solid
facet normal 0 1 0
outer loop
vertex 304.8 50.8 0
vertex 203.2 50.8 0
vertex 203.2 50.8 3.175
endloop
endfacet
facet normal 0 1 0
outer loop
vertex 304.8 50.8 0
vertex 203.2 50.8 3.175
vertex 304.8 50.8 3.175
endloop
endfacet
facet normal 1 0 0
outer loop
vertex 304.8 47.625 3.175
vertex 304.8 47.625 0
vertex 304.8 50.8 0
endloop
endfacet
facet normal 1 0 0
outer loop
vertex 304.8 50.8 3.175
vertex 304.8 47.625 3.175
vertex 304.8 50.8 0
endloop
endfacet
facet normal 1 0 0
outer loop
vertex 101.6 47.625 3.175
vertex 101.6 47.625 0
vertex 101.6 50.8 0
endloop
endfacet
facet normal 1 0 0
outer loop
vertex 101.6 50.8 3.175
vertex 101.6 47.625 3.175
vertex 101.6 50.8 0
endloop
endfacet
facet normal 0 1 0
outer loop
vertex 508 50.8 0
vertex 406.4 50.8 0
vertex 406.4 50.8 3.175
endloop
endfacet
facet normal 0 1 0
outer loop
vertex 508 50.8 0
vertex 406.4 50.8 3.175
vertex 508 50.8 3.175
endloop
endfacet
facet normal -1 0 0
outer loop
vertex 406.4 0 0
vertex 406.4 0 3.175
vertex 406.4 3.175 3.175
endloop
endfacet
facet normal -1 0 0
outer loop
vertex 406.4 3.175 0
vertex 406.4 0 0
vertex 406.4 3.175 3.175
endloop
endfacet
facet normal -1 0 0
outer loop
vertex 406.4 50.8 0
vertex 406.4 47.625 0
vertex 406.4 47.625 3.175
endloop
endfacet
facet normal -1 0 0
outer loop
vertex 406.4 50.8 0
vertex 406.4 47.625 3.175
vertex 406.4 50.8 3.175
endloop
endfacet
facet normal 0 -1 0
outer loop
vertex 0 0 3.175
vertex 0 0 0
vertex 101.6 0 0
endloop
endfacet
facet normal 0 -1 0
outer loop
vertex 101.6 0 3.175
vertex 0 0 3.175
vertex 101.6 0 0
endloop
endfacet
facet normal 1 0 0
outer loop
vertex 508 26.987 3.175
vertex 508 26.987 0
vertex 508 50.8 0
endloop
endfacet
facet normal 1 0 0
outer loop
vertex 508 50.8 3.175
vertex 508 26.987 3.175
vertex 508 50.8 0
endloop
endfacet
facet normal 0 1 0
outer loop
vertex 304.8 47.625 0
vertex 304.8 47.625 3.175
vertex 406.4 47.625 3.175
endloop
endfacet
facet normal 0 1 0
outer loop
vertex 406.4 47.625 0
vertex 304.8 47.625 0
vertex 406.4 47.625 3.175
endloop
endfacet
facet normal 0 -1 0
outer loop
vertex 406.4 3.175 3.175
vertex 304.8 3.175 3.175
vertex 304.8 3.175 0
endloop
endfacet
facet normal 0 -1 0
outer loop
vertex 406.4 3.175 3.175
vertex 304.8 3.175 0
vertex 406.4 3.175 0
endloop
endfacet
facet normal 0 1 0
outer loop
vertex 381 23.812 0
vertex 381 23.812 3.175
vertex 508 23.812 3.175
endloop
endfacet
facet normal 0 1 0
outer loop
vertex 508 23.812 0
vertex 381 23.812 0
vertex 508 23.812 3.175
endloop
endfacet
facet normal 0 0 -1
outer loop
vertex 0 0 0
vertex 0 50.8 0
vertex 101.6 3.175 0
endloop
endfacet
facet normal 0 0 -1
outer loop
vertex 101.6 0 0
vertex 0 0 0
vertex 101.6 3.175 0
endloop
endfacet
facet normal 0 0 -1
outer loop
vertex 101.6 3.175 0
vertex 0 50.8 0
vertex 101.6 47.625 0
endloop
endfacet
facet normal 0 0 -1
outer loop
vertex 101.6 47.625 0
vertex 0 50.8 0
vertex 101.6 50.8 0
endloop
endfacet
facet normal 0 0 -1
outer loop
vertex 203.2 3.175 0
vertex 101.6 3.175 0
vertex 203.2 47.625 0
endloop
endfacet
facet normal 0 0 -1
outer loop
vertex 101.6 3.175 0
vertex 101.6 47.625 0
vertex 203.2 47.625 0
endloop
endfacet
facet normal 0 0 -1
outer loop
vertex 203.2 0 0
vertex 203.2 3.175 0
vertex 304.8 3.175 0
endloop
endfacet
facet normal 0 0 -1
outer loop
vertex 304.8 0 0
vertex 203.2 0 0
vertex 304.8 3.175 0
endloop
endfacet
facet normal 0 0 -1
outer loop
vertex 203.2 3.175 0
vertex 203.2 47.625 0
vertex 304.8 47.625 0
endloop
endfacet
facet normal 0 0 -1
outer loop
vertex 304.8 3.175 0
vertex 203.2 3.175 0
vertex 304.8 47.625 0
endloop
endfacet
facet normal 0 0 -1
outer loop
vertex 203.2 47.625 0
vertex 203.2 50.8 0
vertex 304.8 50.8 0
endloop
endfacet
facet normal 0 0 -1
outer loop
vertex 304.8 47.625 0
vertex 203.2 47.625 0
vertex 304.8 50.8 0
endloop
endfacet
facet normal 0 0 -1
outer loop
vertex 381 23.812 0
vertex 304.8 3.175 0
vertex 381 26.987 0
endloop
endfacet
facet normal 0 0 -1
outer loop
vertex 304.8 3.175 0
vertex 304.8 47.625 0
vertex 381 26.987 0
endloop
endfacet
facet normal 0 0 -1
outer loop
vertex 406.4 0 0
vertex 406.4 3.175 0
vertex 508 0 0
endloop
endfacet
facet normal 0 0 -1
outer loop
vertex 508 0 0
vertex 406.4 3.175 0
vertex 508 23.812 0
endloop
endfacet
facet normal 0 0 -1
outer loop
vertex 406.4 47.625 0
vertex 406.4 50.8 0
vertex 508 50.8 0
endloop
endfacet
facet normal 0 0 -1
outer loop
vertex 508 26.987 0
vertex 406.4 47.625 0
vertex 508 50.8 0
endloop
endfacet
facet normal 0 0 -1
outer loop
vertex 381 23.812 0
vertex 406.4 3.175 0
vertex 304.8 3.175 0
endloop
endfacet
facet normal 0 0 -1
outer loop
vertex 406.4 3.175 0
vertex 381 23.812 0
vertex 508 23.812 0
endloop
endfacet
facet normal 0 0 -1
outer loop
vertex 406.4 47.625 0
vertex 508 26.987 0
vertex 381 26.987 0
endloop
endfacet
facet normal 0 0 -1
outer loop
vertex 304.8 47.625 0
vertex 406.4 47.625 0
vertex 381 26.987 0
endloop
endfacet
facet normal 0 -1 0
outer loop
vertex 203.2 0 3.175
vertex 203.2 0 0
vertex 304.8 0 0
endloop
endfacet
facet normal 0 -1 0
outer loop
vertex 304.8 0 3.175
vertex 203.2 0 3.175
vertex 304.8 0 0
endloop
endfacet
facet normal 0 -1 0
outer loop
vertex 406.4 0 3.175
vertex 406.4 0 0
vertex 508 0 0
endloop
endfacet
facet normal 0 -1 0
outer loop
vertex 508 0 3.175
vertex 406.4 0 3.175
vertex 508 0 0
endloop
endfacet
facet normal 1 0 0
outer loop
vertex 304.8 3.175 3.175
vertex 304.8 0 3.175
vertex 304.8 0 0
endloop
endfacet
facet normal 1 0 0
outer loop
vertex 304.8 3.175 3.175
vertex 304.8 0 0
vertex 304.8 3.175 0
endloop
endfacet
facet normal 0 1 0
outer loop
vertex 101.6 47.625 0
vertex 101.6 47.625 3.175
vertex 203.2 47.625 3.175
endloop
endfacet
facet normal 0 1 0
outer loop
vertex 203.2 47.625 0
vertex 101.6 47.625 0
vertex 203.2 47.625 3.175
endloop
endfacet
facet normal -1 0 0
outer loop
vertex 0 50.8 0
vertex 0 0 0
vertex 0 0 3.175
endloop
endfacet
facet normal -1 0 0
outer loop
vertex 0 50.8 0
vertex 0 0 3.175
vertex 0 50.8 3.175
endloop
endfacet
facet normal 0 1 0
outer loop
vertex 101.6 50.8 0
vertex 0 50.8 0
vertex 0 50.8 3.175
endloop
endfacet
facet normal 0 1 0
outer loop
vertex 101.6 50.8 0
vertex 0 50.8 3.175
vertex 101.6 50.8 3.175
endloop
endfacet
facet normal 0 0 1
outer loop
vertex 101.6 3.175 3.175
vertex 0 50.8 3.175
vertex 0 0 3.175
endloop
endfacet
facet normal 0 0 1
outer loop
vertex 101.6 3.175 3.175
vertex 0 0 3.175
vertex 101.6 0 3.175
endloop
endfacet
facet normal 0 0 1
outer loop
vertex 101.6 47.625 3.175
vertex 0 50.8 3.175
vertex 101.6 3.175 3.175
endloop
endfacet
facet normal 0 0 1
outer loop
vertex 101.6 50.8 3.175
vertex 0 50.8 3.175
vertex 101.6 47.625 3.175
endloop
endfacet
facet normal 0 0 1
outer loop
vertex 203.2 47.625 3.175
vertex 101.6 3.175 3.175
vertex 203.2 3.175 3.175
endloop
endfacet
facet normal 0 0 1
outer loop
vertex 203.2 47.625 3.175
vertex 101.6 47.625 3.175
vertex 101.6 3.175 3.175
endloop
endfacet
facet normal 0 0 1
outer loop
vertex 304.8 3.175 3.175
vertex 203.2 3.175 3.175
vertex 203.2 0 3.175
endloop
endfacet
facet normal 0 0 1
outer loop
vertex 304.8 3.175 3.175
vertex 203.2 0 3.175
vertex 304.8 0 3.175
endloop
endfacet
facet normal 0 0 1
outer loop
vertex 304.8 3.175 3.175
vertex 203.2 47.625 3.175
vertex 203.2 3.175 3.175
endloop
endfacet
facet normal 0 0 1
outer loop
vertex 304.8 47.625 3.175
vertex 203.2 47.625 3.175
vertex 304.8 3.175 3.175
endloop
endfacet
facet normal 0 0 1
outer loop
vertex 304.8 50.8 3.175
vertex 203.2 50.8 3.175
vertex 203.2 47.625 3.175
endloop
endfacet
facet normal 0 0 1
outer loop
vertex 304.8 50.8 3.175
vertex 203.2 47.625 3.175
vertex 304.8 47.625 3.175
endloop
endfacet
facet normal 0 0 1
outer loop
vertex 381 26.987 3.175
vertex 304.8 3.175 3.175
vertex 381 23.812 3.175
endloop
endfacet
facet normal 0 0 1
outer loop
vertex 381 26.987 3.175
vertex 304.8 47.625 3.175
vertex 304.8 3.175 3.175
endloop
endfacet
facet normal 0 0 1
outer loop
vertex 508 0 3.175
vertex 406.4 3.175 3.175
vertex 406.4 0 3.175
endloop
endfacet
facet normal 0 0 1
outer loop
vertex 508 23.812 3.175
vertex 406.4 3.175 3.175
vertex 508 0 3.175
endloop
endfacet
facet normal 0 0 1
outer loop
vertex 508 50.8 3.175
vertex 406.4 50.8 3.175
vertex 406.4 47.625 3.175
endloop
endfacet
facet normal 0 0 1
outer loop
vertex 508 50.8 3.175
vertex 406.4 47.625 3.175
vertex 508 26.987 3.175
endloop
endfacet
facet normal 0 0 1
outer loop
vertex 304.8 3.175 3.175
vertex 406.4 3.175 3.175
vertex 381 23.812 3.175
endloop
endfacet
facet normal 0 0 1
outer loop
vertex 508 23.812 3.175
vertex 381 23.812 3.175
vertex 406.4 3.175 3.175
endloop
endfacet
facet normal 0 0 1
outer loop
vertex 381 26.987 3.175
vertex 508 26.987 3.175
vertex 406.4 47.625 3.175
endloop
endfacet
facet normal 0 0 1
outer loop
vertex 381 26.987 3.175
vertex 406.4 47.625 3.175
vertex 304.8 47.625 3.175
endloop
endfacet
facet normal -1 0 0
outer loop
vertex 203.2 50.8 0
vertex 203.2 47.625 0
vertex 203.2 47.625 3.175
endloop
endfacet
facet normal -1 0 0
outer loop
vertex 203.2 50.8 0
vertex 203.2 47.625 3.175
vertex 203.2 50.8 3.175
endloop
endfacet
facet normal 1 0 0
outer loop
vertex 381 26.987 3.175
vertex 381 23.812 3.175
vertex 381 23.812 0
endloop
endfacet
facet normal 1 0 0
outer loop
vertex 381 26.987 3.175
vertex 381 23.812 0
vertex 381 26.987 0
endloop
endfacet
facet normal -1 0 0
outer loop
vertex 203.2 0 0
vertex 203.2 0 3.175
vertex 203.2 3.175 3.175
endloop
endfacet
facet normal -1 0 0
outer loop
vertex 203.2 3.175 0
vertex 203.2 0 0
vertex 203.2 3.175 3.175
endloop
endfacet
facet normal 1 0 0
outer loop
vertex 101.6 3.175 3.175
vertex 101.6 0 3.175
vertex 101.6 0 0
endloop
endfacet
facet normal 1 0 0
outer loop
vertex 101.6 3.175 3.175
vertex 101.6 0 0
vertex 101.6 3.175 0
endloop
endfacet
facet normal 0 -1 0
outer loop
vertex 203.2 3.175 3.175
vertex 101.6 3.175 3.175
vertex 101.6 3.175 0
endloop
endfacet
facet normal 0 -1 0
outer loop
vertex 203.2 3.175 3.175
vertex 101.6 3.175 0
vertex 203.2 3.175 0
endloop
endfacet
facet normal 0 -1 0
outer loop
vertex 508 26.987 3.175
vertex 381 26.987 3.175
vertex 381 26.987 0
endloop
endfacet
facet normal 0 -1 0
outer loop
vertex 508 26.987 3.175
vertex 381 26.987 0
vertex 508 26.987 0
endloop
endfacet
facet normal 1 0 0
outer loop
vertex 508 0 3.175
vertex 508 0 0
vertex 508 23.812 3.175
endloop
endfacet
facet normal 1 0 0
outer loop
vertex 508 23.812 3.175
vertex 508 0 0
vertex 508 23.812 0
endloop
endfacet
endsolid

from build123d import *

# Parameters (mm, degrees)
F0_W     = 508
F0_H     = 50.8
F1_DEPTH = 3.175
F2_W     = 101.6
F2_H     = 3.175
F3_DEPTH = 25.4
F4_W     = 101.6
F4_H     = 3.175
F5_DEPTH = 25.4
F6_W     = 127
F6_H     = 3.175
F7_DEPTH = 25.4


with BuildPart() as f1:
    # F0 (on Top) → F1 (new body)
    with BuildSketch(Plane.XY):
        with Locations((254, 25.4)):
            Rectangle(F0_W, F0_H)
    extrude(amount=F1_DEPTH)

    # F2 (on face) → F3 (cut)
    with BuildSketch(Plane.XY.offset(3.175)):
        with Locations((152.4, 1.5875)):
            Rectangle(F2_W, F2_H)
        with Locations((355.6, 1.5875)):
            Rectangle(F2_W, F2_H)
    extrude(amount=-F3_DEPTH, mode=Mode.SUBTRACT)

    # F4 (on face) → F5 (cut)
    with BuildSketch(Plane.XY.offset(3.175)):
        with Locations((152.4, 49.2125)):
            Rectangle(F4_W, F4_H)
        with Locations((355.6, 49.2125)):
            Rectangle(F4_W, F4_H)
    extrude(amount=-F5_DEPTH, mode=Mode.SUBTRACT)

    # F6 (on face) → F7 (cut)
    with BuildSketch(Plane.XY.offset(3.175)):
        with Locations((444.5, 25.4)):
            Rectangle(F6_W, F6_H)
    extrude(amount=-F7_DEPTH, mode=Mode.SUBTRACT)


solid = f1.part
